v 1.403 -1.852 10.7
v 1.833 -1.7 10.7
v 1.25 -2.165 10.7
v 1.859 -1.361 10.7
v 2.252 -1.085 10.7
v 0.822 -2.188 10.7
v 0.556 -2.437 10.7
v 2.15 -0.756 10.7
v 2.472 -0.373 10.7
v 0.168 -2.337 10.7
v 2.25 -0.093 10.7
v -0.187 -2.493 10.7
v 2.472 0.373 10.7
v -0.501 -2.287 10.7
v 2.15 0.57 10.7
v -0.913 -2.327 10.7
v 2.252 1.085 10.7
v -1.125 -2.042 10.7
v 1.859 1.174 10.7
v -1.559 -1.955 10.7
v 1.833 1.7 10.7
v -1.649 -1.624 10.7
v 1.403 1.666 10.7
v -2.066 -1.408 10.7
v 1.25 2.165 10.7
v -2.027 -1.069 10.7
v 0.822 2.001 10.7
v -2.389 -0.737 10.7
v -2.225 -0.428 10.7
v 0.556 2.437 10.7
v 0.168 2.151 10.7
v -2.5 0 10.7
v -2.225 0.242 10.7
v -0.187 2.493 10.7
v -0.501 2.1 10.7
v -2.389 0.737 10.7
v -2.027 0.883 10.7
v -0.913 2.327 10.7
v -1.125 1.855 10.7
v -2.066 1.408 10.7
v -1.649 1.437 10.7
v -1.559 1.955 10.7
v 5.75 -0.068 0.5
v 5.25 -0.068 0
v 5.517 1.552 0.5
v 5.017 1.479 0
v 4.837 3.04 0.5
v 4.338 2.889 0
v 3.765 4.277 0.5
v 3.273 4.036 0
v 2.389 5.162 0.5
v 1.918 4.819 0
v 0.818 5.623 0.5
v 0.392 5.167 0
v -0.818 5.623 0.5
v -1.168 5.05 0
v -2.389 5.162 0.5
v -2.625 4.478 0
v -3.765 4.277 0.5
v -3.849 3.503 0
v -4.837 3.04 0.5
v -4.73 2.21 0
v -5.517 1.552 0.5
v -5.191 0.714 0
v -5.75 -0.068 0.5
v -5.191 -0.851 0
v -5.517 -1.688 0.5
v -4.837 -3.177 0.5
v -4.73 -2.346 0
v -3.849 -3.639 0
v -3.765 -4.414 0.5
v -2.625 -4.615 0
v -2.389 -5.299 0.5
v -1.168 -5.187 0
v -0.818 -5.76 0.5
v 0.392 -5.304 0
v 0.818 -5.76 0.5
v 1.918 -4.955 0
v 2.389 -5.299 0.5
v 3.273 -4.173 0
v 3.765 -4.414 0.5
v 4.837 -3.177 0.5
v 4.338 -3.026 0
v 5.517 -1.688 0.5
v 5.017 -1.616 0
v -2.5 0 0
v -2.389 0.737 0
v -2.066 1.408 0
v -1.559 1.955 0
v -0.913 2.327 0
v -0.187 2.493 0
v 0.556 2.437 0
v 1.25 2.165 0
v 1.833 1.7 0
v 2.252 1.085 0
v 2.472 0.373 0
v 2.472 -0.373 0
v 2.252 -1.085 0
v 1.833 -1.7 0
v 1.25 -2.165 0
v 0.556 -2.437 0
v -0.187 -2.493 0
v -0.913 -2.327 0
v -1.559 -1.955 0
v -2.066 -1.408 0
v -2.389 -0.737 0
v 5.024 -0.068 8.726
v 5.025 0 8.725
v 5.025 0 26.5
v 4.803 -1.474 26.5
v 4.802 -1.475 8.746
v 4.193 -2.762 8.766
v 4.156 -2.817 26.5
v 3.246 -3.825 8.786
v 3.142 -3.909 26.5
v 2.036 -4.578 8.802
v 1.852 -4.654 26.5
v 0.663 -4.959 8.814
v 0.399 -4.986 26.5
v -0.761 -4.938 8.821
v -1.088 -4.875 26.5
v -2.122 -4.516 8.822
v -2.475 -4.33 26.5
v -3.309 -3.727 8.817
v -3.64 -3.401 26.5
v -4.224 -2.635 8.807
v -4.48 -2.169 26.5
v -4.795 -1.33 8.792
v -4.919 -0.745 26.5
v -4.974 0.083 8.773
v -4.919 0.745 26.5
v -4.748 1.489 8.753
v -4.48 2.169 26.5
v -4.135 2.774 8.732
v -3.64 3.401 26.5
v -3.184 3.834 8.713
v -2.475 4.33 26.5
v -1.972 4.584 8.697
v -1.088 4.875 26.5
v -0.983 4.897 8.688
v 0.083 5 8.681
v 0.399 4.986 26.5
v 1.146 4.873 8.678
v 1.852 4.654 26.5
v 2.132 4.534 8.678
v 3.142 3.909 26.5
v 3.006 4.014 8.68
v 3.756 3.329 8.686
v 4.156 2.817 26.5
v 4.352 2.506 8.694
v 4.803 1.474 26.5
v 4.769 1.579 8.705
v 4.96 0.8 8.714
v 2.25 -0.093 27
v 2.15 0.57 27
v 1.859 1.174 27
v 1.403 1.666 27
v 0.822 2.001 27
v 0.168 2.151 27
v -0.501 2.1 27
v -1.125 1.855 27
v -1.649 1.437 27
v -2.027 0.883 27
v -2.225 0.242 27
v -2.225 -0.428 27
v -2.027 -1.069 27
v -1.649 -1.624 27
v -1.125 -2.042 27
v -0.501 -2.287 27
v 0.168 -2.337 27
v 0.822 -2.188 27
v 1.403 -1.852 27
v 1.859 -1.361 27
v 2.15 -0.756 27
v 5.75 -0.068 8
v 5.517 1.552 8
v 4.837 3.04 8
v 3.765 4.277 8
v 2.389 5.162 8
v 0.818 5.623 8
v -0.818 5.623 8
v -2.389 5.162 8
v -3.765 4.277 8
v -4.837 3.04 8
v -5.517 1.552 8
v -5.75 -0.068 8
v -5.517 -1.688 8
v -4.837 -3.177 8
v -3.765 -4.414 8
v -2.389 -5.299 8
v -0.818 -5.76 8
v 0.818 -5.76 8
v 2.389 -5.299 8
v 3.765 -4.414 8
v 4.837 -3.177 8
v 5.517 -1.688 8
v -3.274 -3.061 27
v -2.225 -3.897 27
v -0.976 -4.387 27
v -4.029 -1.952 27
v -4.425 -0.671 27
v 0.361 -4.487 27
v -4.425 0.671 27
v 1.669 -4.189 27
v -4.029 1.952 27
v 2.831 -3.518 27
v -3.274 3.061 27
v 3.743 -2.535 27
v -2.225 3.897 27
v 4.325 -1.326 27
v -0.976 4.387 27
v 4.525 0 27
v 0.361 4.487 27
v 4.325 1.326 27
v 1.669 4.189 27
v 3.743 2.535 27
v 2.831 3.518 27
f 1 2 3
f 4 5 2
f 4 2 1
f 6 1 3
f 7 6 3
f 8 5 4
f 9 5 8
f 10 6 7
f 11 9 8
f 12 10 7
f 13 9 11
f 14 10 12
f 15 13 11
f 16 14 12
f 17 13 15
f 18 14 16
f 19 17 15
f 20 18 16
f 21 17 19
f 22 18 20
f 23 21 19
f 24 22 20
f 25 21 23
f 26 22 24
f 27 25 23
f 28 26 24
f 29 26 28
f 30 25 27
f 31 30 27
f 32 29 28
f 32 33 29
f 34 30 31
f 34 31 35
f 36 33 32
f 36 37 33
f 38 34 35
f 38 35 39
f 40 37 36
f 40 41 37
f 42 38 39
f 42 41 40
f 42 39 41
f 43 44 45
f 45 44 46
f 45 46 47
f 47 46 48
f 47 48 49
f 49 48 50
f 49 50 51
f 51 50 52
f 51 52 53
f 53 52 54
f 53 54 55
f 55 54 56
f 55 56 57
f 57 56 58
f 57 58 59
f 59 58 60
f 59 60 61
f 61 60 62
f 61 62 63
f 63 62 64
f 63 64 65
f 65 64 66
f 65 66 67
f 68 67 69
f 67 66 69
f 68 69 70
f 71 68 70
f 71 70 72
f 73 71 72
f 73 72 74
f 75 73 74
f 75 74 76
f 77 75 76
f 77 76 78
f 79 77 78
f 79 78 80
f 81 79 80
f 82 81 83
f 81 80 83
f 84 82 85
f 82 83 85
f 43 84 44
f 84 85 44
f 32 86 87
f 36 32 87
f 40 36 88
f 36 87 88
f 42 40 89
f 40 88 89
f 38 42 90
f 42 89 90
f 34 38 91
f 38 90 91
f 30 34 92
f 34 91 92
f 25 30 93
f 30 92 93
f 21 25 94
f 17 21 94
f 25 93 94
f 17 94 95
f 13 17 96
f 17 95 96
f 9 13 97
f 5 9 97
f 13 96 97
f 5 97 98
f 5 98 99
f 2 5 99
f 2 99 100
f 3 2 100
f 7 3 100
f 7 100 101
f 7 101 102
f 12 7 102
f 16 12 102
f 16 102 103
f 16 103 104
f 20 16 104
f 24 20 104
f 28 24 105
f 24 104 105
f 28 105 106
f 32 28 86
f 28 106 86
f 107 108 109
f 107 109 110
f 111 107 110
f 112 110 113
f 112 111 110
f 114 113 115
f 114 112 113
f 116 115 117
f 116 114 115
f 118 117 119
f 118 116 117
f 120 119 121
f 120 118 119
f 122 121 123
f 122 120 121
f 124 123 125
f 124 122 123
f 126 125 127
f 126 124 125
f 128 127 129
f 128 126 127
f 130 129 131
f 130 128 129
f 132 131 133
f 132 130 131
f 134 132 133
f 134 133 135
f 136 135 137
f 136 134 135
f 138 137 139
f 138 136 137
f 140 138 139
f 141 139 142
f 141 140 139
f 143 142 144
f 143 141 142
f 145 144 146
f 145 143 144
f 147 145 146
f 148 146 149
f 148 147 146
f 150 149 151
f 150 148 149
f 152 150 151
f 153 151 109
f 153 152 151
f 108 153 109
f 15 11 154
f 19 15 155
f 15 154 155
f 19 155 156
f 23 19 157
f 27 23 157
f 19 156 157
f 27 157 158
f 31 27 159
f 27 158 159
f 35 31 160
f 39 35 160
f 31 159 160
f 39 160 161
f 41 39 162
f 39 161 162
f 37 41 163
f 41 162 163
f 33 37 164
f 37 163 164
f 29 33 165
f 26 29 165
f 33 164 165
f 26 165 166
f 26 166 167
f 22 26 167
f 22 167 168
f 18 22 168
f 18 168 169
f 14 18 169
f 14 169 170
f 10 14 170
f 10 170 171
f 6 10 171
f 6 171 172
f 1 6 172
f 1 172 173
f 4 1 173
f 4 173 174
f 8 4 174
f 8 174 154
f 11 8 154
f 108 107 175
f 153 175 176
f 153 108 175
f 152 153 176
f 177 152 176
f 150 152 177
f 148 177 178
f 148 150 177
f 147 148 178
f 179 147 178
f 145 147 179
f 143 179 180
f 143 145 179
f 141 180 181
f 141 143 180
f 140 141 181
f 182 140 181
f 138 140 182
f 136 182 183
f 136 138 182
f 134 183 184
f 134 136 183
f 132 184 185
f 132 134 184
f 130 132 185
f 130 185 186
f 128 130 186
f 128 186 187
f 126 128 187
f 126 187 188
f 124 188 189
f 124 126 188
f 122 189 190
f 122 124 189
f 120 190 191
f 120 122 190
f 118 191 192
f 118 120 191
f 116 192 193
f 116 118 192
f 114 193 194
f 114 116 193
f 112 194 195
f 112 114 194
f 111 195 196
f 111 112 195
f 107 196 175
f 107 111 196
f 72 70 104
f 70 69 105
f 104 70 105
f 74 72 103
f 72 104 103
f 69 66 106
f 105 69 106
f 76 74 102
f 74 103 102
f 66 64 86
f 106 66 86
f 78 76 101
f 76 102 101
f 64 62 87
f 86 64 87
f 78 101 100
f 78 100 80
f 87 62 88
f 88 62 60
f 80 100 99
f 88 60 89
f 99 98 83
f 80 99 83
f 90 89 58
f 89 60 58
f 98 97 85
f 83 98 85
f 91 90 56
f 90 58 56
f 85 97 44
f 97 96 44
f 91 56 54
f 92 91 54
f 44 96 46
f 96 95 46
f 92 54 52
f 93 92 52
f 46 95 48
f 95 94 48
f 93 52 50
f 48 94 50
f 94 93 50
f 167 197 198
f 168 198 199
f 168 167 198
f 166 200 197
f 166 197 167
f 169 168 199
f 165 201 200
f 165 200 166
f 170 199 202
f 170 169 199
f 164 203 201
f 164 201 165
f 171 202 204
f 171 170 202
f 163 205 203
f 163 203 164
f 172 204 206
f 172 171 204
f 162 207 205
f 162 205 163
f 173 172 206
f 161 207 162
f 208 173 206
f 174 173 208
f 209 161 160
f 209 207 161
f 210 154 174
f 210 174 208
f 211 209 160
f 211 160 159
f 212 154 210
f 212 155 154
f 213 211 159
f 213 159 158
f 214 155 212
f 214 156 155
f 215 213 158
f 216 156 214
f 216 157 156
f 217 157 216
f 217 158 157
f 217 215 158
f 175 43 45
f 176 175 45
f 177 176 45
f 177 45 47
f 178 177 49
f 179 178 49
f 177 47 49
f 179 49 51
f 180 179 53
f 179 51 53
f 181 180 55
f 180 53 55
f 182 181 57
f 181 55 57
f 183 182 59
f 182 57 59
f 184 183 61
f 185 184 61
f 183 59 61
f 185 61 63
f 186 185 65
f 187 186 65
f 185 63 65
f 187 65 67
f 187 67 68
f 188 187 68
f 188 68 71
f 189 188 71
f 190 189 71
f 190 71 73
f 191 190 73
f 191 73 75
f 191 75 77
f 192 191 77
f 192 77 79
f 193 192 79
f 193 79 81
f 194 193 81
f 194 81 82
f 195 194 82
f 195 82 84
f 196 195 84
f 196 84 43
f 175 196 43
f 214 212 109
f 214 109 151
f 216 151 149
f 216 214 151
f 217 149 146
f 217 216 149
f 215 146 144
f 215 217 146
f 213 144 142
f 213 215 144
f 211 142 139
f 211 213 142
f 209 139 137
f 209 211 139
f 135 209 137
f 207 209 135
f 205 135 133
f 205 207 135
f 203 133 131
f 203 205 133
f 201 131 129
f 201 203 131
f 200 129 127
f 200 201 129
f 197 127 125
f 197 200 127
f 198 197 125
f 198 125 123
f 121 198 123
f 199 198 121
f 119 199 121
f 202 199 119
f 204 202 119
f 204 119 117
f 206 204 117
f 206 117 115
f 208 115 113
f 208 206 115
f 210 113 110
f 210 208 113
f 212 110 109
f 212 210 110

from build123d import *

# Parameters (mm, degrees)
SKETCH2_R           = 5.75
BOSS_EXTRUDE2_DEPTH = 10
SKETCH3_R           = 5
BOSS_EXTRUDE3_DEPTH = 17
SKETCH4_R           = 2.5
CUT_EXTRUDE1_DEPTH  = 10.7
SKETCH5_R           = 2.25
CUT_EXTRUDE2_DEPTH  = 17.7
CHAMFER4_SIZE       = 2
CHAMFER5_SIZE       = 0.5
CHAMFER6_SIZE       = 0.5


with BuildPart() as part:
    # Sketch2 → Boss-Extrude2 (new body)
    with BuildSketch(Plane.XY):
        with Locations((0, -0.068254458)):
            Circle(SKETCH2_R)
    extrude(amount=BOSS_EXTRUDE2_DEPTH)

    # Sketch3 → Boss-Extrude3 (add)
    with BuildSketch(Plane.XY.offset(10)):
        with Locations((0.02487522, 0)):
            Circle(SKETCH3_R)
    extrude(amount=BOSS_EXTRUDE3_DEPTH)

    # Sketch4 → Cut-Extrude1 (cut)
    with BuildSketch(Plane(origin=(0, 0, 0), x_dir=(-1, 0, 0), z_dir=(0, 0, -1))):
        Circle(SKETCH4_R)
    extrude(amount=-CUT_EXTRUDE1_DEPTH, mode=Mode.SUBTRACT)

    # Sketch5 → Cut-Extrude2 (cut)
    with BuildSketch(Plane.XY.offset(27)):
        with Locations((0, -0.093129678)):
            Circle(SKETCH5_R)
    extrude(amount=-CUT_EXTRUDE2_DEPTH, mode=Mode.SUBTRACT)

    # Chamfer4
    # the kernel refuses this chamfer: 2 mm, written as the material it takes off along each edge
    with BuildSketch(Plane(origin=(0, -0.068254458, 10), x_dir=(1, 0, 0), z_dir=(0, -1, 0))) as chamfer4_piece_1_section:
        Polygon((5.75, -CHAMFER4_SIZE), (5.75 - CHAMFER4_SIZE, 0), (5.75, 0), align=None)
    chamfer4_piece_1 = revolve(axis=Axis((0, -0.068254458, 10), (0, 0, 1)), mode=Mode.PRIVATE)
    chamfer4_piece_1 = chamfer4_piece_1 - Plane(origin=(0.02487522, 0, 8.408355985), x_dir=(1, 0, 0), z_dir=(0, 0, -1)) * Cylinder(5, 23, mode=Mode.PRIVATE)
    add(chamfer4_piece_1, mode=Mode.SUBTRACT)

    # Chamfer5
    chamfer5_edges = [part.edges().sort_by_distance(p)[0] for p in [
        (-4.97512478, 0, 27),
    ]]
    chamfer(chamfer5_edges, length=CHAMFER5_SIZE)

    # Chamfer6
    chamfer6_edges = [part.edges().sort_by_distance(p)[0] for p in [
        (-5.75, -0.068254458, 0),
    ]]
    chamfer(chamfer6_edges, length=CHAMFER6_SIZE)


solid = part.part
